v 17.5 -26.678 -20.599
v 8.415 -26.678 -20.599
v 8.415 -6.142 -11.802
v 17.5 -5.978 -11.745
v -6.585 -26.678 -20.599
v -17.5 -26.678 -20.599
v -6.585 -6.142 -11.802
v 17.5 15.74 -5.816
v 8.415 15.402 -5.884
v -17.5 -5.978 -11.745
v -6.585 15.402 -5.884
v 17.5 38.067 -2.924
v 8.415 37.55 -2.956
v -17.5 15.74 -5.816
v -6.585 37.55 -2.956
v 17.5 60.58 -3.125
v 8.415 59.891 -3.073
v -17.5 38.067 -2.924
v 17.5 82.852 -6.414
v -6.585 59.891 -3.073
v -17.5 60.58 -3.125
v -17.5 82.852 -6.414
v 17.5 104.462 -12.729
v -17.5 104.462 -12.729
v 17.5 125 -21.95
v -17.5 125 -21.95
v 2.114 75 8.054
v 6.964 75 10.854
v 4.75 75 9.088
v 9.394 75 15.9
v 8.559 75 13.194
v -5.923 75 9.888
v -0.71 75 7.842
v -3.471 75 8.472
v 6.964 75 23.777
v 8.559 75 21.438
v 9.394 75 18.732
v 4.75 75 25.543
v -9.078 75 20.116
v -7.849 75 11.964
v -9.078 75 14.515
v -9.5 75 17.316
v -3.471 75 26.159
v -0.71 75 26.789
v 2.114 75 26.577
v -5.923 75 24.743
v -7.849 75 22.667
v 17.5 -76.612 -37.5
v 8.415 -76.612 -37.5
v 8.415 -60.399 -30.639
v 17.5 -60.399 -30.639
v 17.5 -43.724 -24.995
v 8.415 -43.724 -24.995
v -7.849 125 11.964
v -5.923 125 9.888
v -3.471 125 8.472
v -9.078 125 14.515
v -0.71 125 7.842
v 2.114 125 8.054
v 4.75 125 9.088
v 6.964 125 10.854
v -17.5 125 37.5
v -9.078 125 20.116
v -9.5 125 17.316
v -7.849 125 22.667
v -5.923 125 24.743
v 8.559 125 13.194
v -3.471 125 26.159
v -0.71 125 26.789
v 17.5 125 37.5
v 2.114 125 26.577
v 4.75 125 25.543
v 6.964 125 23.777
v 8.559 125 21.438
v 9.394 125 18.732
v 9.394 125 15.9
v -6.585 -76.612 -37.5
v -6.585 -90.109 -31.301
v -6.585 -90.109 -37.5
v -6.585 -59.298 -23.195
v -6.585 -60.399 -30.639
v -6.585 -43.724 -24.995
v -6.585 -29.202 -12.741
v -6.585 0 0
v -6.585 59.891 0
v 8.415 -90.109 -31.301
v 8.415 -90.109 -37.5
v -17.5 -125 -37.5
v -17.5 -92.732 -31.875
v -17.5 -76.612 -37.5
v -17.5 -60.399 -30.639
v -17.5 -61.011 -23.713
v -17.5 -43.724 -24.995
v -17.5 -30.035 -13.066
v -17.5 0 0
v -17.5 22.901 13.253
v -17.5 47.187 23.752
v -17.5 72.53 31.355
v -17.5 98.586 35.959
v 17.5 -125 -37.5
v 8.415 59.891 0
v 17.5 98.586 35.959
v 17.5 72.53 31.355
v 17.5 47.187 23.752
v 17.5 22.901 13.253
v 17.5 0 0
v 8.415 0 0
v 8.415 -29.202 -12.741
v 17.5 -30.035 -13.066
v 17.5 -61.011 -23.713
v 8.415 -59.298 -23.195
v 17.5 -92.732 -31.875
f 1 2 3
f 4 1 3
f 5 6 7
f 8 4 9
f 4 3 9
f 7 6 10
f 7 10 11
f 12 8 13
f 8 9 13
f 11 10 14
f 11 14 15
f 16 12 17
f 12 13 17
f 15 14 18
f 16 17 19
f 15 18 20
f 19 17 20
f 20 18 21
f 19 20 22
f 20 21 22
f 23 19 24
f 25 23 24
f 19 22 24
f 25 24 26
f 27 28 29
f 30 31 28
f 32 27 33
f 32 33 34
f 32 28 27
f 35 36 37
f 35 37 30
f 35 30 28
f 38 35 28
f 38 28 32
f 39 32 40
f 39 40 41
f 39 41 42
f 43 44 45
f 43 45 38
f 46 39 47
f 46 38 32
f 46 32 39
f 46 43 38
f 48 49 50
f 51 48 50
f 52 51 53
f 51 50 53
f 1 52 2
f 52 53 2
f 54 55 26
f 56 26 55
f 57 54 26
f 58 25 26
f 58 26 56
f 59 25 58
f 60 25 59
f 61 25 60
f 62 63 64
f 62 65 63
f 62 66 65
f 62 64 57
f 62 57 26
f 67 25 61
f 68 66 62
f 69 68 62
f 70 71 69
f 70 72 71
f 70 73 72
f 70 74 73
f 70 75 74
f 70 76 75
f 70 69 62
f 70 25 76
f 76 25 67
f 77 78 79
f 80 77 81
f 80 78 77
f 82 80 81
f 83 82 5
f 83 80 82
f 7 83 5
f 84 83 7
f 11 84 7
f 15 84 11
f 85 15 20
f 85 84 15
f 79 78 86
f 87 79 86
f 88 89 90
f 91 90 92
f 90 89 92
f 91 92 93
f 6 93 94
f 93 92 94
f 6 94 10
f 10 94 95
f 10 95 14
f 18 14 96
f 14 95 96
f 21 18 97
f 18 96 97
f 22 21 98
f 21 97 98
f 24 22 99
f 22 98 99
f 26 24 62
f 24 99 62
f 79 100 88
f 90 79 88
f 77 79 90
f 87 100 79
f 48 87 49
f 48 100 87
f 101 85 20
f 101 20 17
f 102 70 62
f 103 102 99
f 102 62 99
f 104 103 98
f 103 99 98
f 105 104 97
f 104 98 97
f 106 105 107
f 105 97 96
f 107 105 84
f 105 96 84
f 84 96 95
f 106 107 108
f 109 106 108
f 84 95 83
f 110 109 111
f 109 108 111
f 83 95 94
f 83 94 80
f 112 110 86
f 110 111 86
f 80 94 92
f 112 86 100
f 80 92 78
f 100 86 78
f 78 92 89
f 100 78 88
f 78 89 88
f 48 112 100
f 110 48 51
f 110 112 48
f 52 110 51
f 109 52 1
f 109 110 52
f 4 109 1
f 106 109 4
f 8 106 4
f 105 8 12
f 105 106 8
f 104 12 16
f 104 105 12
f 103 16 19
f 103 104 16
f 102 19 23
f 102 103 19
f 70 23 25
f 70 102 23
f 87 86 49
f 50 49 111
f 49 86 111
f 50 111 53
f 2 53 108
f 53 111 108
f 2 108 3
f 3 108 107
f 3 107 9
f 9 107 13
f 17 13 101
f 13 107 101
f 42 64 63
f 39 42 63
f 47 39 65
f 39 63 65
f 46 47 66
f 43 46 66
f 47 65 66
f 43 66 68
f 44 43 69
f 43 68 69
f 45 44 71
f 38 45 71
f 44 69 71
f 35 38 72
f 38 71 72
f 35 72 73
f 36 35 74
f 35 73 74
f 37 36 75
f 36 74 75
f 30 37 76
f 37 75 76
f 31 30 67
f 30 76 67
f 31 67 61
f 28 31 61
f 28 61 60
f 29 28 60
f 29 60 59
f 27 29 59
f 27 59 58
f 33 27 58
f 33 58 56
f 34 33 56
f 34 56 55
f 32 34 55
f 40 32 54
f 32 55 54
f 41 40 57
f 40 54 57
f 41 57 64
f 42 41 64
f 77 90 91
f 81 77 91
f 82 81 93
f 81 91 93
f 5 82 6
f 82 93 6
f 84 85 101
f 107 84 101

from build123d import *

# Parameters (mm, degrees)
F0_W     = 250
F0_H     = 75
F1_DEPTH = 17.5
F3_DEPTH = 35.001
F4_R     = 9.5
F5_DEPTH = 50
F6_W     = 15
F6_H     = 150
F7_DEPTH = 37.501


with BuildPart() as f1:
    # F0 (on Right) → F1 (new body, symmetric)
    with BuildSketch(Plane.YZ):
        Rectangle(F0_W, F0_H)
    extrude(amount=F1_DEPTH, both=True)

    # F2 (on face) → F3 (cut, through all)
    with BuildSketch(Plane(origin=(-17.5, 0, 0), x_dir=(0, -1, 0), z_dir=(-1, 0, 0))):
        with BuildLine():
            ThreePointArc((-125, 37.5), (-59.748084, 27.923052), (0, 0))
            ThreePointArc((0, 0), (61.011045, -23.713184), (125, -37.5))
            Line((125, -37.5), (125, 37.5))
            Line((125, 37.5), (-125, 37.5))
        make_face()
        with BuildLine():
            Line((-125, -37.5), (76.611606, -37.5))
            ThreePointArc((76.611606, -37.5), (52.114015, -27.662953), (26.677744, -20.59927))
            ThreePointArc((26.677744, -20.59927), (-50.552427, -16.563242), (-125, -37.5))
        make_face()
        with BuildLine():
            ThreePointArc((26.677744, -20.59927), (-49.327107, -2.636934), (-125, -21.950044))
            Line((-125, -21.950044), (-125, -37.5))
            ThreePointArc((-125, -37.5), (-50.552427, -16.563242), (26.677744, -20.59927))
        make_face()
    extrude(amount=-F3_DEPTH, mode=Mode.SUBTRACT)

    # F4 (on face) → F5 (cut)
    with BuildSketch(Plane(origin=(0, 125, 0), x_dir=(-1, 0, 0), z_dir=(0, 1, 0))):
        with Locations((0, 17.31561)):
            Circle(F4_R)
    extrude(amount=-F5_DEPTH, mode=Mode.SUBTRACT)

    # F6 (on Top) → F7 (cut, through all)
    with BuildSketch(Plane.XY):
        with Locations((0.914634, -15.109161)):
            Rectangle(F6_W, F6_H)
    extrude(amount=-F7_DEPTH, mode=Mode.SUBTRACT)


solid = f1.part
